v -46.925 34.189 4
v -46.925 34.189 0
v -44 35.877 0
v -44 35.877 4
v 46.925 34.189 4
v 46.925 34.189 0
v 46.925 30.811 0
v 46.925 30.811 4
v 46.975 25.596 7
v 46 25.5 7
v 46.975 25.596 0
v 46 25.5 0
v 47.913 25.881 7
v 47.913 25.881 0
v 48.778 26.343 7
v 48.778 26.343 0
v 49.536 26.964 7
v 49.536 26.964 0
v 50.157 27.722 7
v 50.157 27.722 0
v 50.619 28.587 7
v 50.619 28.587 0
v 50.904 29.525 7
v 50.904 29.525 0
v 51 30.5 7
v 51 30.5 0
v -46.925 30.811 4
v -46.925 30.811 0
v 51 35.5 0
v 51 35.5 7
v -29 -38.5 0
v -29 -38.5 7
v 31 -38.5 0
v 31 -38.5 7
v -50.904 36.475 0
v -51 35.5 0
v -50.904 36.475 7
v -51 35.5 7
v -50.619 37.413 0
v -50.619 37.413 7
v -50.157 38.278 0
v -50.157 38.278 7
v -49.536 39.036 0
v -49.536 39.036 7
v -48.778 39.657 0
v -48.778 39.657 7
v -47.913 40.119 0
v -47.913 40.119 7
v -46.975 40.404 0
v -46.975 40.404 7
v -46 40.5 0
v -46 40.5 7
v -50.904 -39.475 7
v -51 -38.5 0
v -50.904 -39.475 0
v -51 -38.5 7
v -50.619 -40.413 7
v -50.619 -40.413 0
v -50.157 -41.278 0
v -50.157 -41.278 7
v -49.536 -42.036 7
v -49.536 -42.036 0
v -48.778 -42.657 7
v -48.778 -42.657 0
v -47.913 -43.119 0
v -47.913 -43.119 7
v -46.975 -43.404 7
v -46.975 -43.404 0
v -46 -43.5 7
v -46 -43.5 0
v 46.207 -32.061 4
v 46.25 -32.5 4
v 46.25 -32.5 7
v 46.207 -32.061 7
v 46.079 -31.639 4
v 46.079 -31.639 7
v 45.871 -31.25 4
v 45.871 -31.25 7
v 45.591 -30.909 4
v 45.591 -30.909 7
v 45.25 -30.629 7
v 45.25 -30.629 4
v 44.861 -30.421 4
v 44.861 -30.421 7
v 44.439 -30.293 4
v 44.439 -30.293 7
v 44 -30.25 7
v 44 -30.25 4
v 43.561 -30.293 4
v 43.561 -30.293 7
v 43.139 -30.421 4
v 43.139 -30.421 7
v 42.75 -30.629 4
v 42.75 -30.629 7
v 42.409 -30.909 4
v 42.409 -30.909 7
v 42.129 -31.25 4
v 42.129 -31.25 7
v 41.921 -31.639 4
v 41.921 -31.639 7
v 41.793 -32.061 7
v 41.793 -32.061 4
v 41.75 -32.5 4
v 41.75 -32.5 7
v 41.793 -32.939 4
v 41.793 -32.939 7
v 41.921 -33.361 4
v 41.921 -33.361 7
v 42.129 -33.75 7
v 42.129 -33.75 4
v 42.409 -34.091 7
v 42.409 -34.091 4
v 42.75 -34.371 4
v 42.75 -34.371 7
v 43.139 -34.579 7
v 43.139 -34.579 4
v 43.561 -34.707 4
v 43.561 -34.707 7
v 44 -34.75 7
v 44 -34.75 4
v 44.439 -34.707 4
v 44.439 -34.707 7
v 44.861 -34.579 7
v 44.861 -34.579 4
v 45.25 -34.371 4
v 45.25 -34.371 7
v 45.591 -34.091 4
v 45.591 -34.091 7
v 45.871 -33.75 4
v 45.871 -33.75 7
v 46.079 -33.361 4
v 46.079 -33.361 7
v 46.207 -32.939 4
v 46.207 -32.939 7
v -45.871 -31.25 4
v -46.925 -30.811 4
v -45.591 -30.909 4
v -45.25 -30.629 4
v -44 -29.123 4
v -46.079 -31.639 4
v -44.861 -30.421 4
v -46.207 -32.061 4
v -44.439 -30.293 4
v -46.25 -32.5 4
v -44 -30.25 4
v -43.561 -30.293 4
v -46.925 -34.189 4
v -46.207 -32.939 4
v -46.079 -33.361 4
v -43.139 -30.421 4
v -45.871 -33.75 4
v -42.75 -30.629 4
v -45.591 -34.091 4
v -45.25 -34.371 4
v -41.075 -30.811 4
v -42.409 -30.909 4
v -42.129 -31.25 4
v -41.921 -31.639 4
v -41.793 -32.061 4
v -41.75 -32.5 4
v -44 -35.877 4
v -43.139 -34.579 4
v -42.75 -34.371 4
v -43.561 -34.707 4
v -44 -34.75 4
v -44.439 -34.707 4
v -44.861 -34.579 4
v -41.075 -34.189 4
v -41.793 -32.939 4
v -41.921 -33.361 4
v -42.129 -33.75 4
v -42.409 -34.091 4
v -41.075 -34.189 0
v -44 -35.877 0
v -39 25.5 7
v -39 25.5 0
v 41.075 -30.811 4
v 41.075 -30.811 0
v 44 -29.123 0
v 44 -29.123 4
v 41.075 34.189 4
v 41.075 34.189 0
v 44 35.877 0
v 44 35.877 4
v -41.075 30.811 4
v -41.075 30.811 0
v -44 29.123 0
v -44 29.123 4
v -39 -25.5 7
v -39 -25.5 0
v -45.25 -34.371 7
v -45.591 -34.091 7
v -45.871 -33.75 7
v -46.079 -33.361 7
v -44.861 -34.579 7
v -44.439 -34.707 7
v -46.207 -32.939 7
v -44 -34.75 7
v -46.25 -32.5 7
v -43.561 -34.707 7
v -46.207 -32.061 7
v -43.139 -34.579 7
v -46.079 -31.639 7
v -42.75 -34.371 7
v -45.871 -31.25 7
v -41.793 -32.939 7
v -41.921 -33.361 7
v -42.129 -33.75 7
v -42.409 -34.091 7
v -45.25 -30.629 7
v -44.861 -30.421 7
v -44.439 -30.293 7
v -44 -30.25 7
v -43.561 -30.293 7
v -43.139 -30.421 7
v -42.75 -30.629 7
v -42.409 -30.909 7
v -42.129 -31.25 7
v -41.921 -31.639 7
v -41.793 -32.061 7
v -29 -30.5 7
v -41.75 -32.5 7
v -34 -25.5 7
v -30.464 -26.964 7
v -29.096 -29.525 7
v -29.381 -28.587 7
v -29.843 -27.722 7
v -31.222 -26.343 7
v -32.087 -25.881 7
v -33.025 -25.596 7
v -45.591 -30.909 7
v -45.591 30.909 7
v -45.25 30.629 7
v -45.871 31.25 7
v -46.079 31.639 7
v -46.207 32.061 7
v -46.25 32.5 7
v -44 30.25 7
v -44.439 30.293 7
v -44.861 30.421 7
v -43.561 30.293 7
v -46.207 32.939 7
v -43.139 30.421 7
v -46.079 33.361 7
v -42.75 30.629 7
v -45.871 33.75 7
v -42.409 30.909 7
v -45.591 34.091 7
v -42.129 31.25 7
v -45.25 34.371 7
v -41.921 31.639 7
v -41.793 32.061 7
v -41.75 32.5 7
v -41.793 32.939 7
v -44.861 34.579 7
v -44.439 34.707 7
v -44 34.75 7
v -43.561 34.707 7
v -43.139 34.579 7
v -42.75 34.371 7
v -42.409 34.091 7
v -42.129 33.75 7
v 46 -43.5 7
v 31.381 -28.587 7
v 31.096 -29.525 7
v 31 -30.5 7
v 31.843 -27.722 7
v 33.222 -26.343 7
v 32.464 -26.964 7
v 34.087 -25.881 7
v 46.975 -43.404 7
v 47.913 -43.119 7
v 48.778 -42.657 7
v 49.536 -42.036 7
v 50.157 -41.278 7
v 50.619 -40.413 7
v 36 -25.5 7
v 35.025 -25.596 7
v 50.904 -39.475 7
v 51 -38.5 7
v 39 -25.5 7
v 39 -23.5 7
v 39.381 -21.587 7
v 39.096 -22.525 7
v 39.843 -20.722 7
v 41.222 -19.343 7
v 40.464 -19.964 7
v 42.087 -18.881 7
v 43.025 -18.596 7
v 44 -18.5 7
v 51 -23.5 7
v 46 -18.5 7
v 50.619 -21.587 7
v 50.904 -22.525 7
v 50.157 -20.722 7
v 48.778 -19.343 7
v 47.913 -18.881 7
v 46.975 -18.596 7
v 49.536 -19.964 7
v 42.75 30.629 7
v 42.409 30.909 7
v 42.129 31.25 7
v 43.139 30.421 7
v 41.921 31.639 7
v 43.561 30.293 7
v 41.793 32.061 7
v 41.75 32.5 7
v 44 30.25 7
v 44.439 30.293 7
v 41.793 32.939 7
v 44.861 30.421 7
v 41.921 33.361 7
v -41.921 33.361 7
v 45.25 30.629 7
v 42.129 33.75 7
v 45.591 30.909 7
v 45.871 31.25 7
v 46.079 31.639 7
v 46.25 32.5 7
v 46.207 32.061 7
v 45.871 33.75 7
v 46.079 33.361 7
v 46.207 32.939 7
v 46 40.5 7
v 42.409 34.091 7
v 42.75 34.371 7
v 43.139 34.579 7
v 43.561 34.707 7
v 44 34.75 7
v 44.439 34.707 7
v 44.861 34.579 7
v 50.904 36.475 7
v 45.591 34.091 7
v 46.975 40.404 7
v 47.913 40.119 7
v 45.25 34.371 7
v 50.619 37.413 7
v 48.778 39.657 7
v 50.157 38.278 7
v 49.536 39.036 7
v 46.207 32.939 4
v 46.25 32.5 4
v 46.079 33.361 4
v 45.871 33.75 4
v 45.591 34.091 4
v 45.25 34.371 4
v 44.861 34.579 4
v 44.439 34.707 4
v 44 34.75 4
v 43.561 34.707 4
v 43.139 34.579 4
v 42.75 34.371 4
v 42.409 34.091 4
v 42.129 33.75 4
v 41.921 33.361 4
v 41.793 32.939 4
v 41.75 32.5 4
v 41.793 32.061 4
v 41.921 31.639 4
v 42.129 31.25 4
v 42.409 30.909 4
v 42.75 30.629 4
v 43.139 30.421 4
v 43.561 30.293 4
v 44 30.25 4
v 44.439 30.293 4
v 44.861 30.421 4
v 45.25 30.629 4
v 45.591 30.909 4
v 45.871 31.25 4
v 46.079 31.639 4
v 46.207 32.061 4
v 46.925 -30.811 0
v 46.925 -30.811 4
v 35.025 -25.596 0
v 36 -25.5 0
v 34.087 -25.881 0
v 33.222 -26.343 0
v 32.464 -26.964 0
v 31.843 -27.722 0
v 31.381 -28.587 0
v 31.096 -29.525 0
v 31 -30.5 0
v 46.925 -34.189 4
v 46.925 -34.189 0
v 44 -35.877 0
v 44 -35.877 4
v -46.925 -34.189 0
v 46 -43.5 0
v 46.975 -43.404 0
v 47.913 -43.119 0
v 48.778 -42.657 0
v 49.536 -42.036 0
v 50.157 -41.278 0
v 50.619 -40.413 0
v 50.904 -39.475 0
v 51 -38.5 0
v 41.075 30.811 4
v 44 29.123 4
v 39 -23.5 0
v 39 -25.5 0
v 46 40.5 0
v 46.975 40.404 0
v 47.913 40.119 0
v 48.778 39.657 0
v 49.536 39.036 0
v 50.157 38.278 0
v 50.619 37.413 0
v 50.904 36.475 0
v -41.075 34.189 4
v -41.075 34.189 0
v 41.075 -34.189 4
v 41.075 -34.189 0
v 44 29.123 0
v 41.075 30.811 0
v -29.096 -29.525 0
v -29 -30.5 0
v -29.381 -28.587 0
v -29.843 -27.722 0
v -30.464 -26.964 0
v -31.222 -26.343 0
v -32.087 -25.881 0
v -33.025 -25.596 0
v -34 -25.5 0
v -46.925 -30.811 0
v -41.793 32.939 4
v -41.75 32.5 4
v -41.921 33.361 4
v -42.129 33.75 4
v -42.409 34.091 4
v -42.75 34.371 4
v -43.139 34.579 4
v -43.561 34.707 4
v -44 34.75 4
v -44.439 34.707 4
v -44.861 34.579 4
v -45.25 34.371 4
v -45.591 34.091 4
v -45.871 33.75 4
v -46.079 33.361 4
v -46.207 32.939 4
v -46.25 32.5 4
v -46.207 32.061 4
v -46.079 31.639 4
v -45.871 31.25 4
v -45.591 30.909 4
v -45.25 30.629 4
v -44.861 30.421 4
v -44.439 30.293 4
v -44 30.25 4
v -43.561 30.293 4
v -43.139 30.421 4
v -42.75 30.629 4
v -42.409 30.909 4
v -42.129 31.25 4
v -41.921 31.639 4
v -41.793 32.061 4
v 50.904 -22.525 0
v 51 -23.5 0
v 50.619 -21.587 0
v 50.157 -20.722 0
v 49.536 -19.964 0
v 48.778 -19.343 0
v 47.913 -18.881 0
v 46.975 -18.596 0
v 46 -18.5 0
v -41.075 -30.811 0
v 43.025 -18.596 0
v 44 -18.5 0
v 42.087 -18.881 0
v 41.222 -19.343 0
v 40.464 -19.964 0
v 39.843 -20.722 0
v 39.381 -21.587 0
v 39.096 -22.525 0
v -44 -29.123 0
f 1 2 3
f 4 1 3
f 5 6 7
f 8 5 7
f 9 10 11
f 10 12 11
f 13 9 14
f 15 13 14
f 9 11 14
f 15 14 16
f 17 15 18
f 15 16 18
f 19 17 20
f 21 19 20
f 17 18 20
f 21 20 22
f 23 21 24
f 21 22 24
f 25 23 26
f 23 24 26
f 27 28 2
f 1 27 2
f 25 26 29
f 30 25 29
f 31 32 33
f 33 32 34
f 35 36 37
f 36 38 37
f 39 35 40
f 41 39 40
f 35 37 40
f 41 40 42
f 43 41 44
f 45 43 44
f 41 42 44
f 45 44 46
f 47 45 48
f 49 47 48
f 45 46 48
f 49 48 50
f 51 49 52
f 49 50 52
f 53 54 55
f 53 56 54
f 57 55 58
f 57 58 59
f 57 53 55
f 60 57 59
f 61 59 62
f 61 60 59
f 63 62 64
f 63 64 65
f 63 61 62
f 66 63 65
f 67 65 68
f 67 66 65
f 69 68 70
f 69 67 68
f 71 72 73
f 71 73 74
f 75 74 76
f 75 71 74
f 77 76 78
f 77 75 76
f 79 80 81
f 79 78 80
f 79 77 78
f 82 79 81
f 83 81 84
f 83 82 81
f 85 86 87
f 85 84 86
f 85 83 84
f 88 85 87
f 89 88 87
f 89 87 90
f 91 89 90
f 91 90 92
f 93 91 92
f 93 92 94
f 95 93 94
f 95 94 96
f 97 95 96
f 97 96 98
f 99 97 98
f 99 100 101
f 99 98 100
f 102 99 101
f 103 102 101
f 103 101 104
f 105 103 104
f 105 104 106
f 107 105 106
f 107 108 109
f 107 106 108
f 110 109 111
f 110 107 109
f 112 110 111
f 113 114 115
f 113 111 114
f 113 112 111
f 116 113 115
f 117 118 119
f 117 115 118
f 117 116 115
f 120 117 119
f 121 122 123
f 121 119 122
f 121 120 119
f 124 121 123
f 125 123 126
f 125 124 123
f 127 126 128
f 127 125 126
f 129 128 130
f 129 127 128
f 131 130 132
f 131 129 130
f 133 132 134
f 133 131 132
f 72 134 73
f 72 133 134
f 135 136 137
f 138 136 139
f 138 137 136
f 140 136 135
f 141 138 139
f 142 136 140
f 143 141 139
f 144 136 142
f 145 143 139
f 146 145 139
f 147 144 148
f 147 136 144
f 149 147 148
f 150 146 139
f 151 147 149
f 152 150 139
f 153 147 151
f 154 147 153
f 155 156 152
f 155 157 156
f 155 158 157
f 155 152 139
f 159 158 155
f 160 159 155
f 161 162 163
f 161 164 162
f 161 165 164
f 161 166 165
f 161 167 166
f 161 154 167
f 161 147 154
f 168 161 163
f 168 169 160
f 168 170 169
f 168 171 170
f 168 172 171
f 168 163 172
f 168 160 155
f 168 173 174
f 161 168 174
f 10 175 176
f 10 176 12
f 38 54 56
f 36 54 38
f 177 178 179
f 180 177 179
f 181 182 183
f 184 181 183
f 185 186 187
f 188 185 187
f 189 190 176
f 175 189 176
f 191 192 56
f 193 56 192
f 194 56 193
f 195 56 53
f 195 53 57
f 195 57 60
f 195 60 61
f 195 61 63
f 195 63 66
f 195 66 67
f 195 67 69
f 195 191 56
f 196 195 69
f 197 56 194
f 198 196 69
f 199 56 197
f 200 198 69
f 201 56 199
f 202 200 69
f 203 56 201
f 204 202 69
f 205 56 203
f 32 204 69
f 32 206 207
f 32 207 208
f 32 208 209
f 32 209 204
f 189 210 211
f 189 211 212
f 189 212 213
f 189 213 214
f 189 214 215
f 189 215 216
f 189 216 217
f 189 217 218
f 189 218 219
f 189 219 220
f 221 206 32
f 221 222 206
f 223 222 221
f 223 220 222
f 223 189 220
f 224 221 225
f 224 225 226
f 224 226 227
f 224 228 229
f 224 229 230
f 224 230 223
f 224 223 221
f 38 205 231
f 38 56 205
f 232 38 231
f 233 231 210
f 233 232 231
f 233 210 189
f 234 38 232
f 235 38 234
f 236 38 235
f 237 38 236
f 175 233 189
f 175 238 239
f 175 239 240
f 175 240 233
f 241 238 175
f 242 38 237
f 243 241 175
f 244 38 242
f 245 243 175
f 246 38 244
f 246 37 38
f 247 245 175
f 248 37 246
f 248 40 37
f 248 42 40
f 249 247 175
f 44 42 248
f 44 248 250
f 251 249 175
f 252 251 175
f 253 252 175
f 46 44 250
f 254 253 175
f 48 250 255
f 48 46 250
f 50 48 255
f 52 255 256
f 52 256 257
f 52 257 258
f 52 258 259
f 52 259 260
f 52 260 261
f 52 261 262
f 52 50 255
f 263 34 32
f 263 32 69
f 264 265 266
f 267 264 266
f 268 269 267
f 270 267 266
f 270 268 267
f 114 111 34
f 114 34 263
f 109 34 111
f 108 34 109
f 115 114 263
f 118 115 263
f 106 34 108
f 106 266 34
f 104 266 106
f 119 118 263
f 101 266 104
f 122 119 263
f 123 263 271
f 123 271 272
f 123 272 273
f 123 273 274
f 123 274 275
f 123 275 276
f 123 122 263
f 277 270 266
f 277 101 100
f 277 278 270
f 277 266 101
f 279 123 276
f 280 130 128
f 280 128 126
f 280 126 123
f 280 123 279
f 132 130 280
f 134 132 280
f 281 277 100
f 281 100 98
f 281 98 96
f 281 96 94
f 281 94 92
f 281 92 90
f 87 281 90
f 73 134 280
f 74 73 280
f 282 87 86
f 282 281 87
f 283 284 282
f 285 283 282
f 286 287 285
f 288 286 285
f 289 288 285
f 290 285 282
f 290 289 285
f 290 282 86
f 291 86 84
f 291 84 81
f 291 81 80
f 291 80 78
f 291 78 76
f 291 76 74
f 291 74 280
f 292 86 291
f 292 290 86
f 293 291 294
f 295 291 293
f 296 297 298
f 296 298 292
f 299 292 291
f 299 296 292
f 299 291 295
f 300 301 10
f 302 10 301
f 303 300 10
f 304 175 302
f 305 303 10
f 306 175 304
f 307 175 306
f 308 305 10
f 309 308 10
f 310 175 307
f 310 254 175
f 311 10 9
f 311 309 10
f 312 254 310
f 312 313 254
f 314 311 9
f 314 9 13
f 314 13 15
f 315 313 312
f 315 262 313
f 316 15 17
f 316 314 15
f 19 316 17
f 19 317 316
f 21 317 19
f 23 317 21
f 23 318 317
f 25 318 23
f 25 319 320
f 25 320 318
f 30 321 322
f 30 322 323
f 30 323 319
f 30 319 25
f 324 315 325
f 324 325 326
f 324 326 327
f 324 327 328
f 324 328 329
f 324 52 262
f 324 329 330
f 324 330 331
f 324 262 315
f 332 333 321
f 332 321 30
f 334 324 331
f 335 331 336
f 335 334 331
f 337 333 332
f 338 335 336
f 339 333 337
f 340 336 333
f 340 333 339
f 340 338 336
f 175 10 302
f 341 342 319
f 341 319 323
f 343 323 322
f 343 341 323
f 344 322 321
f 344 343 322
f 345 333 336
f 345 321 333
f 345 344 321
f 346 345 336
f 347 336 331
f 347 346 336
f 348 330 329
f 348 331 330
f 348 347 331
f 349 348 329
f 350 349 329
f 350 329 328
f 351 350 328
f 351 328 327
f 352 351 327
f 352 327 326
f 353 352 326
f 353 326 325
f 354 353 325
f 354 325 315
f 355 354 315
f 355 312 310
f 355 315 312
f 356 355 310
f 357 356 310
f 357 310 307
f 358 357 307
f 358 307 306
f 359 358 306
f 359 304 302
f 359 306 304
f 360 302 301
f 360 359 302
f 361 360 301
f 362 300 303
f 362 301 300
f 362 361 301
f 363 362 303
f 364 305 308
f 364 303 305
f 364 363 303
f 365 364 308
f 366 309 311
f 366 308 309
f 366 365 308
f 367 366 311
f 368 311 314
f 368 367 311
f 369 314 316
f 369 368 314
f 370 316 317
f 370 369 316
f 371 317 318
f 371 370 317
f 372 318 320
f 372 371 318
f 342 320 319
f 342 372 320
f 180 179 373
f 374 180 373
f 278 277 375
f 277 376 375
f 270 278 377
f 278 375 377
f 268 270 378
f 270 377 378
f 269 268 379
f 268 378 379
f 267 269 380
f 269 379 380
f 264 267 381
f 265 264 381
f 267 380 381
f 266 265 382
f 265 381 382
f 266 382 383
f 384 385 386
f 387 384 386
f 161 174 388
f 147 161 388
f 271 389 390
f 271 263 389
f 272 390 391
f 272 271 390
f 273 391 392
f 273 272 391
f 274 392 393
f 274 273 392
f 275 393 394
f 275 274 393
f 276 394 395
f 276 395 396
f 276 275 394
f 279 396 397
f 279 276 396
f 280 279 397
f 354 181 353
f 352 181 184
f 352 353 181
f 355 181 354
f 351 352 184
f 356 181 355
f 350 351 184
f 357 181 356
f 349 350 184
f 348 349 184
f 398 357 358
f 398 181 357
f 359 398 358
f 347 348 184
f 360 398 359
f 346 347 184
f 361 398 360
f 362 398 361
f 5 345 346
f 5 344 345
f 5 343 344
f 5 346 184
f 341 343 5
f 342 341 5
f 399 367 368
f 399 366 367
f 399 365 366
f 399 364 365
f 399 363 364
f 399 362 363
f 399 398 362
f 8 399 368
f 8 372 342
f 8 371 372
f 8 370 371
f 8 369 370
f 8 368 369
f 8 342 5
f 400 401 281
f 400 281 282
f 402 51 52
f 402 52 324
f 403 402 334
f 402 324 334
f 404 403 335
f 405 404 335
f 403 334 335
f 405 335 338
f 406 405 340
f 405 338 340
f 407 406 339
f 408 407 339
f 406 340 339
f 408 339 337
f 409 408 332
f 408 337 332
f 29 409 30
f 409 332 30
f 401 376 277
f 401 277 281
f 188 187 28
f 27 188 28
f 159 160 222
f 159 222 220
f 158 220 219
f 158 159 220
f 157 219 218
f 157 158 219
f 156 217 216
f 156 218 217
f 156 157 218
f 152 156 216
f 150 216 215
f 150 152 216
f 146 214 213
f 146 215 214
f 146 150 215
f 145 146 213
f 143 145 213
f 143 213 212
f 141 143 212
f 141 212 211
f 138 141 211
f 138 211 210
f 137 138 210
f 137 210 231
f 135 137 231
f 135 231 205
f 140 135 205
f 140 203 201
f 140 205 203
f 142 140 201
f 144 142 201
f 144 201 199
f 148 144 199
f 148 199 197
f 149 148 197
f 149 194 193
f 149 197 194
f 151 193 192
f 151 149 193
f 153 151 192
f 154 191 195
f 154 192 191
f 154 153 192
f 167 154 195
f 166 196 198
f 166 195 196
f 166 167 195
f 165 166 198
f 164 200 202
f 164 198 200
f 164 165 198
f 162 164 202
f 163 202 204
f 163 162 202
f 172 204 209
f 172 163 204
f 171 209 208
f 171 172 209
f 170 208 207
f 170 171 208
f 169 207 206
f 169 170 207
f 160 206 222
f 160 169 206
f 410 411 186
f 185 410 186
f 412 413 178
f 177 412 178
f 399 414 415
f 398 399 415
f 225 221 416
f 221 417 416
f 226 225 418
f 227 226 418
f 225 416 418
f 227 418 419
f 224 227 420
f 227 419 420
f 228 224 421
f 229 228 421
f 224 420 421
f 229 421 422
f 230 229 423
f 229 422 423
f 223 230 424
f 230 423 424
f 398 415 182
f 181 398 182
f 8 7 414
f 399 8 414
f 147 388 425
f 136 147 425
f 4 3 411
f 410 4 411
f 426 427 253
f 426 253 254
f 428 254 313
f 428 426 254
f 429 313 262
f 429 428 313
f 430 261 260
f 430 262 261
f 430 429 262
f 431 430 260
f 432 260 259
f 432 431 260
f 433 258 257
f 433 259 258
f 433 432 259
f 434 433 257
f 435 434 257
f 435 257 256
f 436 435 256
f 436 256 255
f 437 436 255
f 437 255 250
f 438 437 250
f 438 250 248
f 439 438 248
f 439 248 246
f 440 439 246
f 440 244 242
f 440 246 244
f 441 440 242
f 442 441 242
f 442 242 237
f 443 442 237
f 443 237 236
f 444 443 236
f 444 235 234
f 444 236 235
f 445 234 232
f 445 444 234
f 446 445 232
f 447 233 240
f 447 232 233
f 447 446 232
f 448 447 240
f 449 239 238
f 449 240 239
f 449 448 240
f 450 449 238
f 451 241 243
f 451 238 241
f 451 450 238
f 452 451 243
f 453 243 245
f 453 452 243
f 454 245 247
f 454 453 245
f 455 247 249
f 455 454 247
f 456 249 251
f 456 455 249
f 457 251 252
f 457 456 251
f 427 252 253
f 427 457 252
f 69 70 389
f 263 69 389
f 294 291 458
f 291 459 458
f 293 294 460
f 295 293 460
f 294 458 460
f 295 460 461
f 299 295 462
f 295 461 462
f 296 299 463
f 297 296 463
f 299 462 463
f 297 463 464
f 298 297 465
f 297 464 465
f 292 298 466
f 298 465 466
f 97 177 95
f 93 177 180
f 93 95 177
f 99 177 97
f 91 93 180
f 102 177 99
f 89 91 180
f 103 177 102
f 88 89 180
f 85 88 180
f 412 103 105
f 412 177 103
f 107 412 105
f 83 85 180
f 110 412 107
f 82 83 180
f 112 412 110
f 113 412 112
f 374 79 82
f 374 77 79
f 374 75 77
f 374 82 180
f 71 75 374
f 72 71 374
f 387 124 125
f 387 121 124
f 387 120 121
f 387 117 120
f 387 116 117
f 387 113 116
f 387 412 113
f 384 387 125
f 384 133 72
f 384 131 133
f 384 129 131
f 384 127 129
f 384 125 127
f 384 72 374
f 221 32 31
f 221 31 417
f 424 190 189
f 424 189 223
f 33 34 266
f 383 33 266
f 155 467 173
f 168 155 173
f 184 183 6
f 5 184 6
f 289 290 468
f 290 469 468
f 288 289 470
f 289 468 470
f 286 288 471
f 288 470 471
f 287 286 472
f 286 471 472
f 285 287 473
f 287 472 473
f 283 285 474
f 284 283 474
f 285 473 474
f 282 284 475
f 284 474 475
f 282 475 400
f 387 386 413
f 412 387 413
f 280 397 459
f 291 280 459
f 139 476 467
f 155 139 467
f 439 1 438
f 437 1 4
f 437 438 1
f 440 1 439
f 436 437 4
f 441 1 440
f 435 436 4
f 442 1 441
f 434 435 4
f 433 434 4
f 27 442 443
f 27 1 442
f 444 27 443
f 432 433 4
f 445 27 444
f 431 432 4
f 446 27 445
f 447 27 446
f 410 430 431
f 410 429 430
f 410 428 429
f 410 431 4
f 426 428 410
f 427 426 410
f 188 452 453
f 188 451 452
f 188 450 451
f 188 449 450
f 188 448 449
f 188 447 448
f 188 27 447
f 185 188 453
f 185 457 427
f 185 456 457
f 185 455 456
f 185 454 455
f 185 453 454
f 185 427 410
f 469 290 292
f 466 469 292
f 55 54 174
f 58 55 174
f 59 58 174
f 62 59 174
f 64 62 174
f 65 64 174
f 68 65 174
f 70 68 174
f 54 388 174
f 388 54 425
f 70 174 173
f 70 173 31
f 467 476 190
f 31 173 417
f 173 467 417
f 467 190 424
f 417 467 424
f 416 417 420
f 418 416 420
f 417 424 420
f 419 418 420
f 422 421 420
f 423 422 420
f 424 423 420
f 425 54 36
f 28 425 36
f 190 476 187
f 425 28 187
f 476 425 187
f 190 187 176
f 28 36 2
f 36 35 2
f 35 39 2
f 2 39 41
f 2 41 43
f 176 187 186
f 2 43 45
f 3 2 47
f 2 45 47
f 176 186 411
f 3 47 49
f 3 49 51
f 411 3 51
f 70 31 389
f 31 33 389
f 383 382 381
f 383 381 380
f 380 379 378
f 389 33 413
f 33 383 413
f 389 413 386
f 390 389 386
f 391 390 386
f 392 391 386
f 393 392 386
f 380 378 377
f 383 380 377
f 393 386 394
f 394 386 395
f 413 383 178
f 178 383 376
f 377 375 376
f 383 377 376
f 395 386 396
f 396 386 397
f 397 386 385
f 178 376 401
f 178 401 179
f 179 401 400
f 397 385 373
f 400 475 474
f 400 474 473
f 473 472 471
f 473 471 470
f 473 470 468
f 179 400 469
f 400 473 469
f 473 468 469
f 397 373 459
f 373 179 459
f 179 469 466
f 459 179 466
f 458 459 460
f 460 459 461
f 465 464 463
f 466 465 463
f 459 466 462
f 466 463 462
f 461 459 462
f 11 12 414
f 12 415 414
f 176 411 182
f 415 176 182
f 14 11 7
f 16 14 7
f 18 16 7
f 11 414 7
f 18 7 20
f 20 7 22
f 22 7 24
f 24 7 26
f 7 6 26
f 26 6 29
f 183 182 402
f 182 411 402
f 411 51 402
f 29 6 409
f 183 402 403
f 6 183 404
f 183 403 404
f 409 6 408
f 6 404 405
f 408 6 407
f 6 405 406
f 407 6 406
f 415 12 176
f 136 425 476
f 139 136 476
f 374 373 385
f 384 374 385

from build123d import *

# Parameters (mm, degrees)
F0_W     = 102
F0_H     = 84
F0_R     = 2.25
F0_W_2   = 78
F0_H_2   = 51
F1_DEPTH = 15
F3_DEPTH = 4
F4_W     = 12
F4_H     = 44
F4_W_2   = 60
F4_H_2   = 13
F5_DEPTH = 15.001
F6_W     = 102
F6_H     = 84
F7_DEPTH = 8
F8_R     = 5


with BuildPart() as f1:
    # F0 (on Top) → F1 (new body)
    with BuildSketch(Plane.XY):
        with Locations((0, -1.5)):
            Rectangle(F0_W, F0_H)
        with Locations((-44, -32.5)):
            Circle(F0_R, mode=Mode.SUBTRACT)
        with Locations((44, -32.5)):
            Circle(F0_R, mode=Mode.SUBTRACT)
        with Locations((-44, 32.5)):
            Circle(F0_R, mode=Mode.SUBTRACT)
        Rectangle(F0_W_2, F0_H_2, mode=Mode.SUBTRACT)
        with Locations((44, 32.5)):
            Circle(F0_R, mode=Mode.SUBTRACT)
    extrude(amount=F1_DEPTH)

    # F2 (on face) → F3 (cut)
    with BuildSketch(Plane(origin=(0, 0, 0), x_dir=(1, 0, 0), z_dir=(0, 0, -1))):
        Polygon((-41.075, 30.8112504626), (-41.075, 34.1887495374), (-44, 35.8774990748), (-46.925, 34.1887495374), (-46.925, 30.8112504626), (-44, 29.1225009252), align=None)
        Polygon((41.075, 34.1887495374), (41.075, 30.8112504626), (44, 29.1225009252), (46.925, 30.8112504626), (46.925, 34.1887495374), (44, 35.8774990748), align=None)
        Polygon((41.075, -30.8112504626), (41.075, -34.1887495374), (44, -35.8774990748), (46.925, -34.1887495374), (46.925, -30.8112504626), (44, -29.1225009252), align=None)
        Polygon((-41.075, -34.1887495374), (-41.075, -30.8112504626), (-44, -29.1225009252), (-46.925, -30.8112504626), (-46.925, -34.1887495374), (-44, -35.8774990748), align=None)
    extrude(amount=-F3_DEPTH, mode=Mode.SUBTRACT)

    # F4 (on face) → F5 (cut, through all)
    with BuildSketch(Plane.XY.offset(15)):
        with Locations((45, 3.5)):
            Rectangle(F4_W, F4_H)
        with Locations((1, -32)):
            Rectangle(F4_W_2, F4_H_2)
    extrude(amount=-F5_DEPTH, mode=Mode.SUBTRACT)

    # F6 (on face) → F7 (cut)
    with BuildSketch(Plane.XY.offset(15)):
        with Locations((0, -1.5)):
            Rectangle(F6_W, F6_H)
    extrude(amount=-F7_DEPTH, mode=Mode.SUBTRACT)

    # F8
    f8_edges = [f1.edges().sort_by_distance(p)[0] for p in [
        (-51, 40.5, 3.5),
        (51, 40.5, 3.5),
        (-51, -43.5, 3.5),
        (51, -43.5, 3.5),
        (51, 25.5, 3.5),
        (51, -18.5, 3.5),
        (39, -18.5, 3.5),
        (31, -25.5, 3.5),
        (-29, -25.5, 3.5),
    ]]
    fillet(f8_edges, radius=F8_R)


solid = f1.part
